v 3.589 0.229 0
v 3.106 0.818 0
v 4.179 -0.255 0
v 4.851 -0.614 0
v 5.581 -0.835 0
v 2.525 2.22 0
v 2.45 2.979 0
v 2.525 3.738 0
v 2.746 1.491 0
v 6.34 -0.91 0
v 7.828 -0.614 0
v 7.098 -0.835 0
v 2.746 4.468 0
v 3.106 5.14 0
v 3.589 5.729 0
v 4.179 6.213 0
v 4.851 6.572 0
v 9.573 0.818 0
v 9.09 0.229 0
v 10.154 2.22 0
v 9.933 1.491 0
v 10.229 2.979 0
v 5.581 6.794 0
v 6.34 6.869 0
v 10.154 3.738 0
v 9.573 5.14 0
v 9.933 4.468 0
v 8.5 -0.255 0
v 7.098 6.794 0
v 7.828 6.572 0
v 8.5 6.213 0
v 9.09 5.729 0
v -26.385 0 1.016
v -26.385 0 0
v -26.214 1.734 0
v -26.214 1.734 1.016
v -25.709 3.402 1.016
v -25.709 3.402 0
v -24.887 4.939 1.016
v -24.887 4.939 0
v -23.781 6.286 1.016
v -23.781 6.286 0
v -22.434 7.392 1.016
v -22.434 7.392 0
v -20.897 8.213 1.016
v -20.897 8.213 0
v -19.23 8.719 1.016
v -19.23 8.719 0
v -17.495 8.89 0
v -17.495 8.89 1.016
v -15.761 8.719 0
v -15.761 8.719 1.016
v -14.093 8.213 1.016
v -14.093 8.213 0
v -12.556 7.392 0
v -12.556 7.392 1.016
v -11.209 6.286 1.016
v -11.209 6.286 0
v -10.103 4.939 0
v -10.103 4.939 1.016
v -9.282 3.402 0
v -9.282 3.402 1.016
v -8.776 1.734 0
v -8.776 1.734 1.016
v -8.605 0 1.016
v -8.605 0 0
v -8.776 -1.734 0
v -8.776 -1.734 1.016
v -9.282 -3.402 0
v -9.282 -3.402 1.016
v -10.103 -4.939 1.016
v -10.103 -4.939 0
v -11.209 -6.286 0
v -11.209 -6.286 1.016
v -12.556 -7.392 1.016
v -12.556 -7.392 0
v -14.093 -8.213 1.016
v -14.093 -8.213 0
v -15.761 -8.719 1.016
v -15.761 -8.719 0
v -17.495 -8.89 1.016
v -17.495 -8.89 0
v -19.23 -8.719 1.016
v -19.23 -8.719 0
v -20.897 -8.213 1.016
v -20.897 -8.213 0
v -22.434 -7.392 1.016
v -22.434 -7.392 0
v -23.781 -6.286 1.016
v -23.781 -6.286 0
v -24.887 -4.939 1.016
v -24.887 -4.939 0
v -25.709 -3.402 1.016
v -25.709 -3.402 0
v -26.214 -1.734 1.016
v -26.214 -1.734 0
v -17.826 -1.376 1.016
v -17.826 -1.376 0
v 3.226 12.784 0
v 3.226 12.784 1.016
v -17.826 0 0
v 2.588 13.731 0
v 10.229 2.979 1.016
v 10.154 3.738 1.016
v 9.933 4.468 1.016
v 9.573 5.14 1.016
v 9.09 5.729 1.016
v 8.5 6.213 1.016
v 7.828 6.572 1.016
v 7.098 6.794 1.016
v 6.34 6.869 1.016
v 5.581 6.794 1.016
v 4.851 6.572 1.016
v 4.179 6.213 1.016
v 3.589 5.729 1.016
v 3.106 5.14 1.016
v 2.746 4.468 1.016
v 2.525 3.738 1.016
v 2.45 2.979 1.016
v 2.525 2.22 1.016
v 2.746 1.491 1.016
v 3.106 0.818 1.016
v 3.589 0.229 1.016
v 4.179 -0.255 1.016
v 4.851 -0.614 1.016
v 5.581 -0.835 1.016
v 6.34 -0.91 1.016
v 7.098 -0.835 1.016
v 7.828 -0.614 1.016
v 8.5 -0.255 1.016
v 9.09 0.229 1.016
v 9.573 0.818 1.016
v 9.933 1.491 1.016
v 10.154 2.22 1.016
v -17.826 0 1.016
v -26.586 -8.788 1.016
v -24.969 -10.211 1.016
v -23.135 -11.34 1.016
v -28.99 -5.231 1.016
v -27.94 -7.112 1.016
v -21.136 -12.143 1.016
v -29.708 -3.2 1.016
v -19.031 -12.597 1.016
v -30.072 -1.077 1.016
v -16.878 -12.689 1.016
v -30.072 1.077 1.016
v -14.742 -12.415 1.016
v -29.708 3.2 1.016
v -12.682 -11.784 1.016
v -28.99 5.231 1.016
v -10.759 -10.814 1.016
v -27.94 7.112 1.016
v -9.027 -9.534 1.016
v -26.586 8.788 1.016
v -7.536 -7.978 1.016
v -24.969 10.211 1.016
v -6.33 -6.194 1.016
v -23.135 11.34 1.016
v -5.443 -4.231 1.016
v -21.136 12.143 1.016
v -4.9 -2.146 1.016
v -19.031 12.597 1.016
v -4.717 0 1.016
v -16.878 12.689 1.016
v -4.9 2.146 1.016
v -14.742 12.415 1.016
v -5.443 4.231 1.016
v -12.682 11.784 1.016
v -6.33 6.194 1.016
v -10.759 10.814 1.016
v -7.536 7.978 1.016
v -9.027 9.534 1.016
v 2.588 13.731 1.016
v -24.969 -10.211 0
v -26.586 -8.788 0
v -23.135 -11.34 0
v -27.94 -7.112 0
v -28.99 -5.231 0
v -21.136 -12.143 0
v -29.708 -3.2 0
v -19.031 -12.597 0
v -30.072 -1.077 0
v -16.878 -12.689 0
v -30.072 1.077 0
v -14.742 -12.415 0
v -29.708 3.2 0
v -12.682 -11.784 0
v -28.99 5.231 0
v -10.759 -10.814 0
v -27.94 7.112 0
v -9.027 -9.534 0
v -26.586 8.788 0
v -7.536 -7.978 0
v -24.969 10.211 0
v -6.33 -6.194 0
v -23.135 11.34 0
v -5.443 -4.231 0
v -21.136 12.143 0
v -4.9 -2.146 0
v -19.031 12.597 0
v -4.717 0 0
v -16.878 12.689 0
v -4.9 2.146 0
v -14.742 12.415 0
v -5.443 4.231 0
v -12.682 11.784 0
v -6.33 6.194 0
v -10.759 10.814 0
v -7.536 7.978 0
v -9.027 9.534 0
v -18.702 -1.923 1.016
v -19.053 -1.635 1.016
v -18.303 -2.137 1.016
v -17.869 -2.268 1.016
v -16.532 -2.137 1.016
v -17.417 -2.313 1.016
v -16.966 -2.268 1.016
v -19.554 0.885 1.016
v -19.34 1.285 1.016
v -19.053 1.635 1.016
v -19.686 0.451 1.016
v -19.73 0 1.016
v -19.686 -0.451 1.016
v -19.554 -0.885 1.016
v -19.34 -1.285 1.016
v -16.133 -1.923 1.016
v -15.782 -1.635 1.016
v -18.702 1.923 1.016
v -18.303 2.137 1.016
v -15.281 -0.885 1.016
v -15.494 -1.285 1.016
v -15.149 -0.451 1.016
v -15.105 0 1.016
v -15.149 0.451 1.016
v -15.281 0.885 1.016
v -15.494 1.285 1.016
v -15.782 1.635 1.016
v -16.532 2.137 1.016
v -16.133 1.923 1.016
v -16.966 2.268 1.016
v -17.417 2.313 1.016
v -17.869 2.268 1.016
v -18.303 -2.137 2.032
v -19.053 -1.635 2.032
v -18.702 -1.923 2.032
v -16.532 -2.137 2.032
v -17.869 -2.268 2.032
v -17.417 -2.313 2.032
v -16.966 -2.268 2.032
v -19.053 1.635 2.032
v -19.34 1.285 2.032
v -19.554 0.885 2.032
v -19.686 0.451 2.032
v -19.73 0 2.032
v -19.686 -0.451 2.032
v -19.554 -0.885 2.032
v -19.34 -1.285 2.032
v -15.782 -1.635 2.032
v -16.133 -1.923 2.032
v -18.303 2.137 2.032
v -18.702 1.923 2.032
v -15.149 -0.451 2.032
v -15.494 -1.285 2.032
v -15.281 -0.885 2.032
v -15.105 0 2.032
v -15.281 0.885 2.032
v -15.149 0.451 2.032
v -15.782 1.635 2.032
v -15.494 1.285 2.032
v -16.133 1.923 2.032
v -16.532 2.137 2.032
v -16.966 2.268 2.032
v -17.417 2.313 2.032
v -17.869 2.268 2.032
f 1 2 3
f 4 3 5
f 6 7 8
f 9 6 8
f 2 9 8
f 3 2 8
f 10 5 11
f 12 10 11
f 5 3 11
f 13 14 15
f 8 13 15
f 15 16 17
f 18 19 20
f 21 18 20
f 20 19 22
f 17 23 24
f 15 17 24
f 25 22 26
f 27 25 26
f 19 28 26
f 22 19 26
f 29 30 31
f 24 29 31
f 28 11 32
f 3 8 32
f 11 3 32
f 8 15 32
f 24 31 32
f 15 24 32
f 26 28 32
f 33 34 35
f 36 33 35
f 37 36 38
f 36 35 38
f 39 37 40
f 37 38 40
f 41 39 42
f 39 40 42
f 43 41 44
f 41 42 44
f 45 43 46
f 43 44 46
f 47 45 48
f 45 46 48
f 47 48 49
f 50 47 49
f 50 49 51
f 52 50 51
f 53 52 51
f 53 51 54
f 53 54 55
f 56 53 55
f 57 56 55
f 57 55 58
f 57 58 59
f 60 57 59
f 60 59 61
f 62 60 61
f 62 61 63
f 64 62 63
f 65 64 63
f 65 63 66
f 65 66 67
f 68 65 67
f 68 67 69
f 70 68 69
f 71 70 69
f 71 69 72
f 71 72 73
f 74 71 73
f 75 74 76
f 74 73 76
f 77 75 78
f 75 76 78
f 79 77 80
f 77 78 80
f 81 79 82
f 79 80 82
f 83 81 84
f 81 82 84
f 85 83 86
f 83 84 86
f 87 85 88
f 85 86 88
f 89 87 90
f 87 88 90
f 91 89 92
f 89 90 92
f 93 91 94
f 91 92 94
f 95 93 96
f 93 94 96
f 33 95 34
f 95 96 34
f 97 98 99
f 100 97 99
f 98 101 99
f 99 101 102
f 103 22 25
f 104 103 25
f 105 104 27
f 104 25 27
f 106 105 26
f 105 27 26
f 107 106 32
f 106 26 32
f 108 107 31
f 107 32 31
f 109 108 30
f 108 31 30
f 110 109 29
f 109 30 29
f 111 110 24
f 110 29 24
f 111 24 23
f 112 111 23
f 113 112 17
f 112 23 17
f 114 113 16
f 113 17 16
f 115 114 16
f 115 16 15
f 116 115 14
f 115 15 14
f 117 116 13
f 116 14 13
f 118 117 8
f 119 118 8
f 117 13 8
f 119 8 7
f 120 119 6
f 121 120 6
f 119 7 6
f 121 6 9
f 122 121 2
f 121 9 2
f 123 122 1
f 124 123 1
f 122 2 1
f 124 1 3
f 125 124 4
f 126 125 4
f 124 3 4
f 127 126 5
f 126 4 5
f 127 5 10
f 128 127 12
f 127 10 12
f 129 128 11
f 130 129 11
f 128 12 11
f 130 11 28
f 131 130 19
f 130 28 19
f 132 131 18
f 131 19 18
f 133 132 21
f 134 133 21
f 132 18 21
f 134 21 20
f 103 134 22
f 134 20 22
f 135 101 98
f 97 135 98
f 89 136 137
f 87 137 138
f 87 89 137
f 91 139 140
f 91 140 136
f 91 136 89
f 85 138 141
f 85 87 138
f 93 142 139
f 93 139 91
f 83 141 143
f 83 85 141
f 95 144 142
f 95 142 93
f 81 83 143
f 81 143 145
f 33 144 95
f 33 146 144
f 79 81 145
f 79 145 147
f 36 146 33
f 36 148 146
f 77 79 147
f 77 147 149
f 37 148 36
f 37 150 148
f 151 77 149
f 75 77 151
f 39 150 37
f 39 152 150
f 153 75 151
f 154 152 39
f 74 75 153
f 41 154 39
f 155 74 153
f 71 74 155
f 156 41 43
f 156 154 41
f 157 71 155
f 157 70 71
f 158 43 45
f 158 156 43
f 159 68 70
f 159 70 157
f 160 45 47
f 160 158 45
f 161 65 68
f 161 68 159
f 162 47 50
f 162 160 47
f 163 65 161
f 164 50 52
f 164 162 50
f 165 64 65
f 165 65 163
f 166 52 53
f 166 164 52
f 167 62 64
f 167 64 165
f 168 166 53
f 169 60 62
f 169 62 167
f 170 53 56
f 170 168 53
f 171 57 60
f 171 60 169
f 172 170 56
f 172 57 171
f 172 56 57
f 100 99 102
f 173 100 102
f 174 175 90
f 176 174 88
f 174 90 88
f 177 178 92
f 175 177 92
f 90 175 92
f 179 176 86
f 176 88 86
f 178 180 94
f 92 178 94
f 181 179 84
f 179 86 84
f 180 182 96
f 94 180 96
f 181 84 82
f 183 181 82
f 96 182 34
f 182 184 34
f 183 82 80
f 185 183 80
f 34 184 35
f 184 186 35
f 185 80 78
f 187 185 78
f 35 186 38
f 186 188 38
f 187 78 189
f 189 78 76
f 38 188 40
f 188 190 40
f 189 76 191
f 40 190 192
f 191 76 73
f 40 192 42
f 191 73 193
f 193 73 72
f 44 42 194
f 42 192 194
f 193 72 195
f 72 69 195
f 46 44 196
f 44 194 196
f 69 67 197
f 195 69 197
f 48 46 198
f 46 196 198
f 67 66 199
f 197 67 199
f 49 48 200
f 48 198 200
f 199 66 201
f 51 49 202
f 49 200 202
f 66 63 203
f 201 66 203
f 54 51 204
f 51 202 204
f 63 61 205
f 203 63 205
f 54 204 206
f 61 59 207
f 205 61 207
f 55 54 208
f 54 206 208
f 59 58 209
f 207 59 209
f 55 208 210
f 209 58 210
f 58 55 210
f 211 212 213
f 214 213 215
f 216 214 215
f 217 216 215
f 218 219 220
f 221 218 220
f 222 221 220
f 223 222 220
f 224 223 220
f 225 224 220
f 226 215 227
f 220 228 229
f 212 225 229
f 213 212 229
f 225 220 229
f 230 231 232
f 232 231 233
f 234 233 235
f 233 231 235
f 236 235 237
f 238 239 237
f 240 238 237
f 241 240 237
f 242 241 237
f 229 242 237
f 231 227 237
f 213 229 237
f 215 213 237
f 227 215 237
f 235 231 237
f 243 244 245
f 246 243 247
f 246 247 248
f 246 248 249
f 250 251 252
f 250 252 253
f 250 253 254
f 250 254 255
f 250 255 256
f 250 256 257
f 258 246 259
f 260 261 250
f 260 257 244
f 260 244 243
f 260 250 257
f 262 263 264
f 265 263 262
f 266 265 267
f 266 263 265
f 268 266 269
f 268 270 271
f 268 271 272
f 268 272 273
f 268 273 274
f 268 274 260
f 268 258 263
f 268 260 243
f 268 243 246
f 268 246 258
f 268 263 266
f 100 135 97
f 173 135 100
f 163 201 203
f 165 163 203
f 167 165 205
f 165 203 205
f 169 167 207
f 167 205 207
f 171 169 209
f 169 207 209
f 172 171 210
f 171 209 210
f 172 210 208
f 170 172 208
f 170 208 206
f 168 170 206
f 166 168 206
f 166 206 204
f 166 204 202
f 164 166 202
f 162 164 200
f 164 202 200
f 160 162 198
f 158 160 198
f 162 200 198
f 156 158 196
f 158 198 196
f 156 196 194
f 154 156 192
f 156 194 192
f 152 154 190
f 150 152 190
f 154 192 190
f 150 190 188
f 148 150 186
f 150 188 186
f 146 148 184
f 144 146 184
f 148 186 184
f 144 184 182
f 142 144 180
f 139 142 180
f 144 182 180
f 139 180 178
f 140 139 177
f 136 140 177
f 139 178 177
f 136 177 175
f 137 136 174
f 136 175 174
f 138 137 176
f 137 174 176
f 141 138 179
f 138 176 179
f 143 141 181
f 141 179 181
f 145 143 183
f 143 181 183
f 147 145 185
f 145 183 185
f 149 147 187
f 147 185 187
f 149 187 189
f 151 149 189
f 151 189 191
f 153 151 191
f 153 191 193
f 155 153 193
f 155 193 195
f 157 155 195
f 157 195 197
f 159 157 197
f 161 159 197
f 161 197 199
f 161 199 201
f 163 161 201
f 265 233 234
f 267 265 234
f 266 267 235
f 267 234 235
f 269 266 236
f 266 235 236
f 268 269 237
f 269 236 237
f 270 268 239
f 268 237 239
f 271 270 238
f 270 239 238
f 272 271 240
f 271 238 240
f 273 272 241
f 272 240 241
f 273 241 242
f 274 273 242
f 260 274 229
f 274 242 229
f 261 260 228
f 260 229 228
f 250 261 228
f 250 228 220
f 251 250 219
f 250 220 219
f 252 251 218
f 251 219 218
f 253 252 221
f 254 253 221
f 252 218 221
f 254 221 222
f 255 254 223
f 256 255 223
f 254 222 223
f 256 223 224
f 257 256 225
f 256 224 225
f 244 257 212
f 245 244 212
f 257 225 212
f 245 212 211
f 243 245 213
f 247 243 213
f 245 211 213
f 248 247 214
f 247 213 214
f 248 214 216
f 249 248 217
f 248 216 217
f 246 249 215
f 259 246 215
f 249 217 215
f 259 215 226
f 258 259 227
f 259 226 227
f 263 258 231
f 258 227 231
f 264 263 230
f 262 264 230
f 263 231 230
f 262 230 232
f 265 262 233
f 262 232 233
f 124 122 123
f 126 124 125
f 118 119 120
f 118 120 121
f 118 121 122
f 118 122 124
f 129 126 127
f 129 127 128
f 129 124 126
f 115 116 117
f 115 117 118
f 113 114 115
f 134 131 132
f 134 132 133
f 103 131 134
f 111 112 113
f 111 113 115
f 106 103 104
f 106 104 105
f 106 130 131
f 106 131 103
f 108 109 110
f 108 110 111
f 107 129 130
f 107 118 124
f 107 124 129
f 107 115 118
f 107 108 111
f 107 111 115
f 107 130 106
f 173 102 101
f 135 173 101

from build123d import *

# Parameters (mm, degrees)
F0_R     = 12.7
F1_DEPTH = 1.016
F4_D     = 17.78
F2_R     = 2.31276
F5_DEPTH = 1.016
F6_R     = 3.889342
F7_DEPTH = 1.016
F9_DEPTH = 1.016


with BuildPart() as f1:
    # F0 (on Top) → F1 (new body)
    with BuildSketch(Plane.XY):
        with Locations((-17.417479, 0)):
            Circle(F0_R)
    extrude(amount=F1_DEPTH)

    # F4 (through all)
    with Locations(Plane.XY.offset(1.016)):
        with Locations((-17.495254, 0)):
            Hole(F4_D / 2)


with BuildPart() as f5:
    # F2 (on face) → F5 (new body)
    with BuildSketch(Plane.XY.offset(1.016)):
        with Locations((-17.417479, 0)):
            Circle(F2_R)
    extrude(amount=F5_DEPTH)


with BuildPart() as f7:
    # F6 (on Top) → F7 (new body)
    with BuildSketch(Plane.XY):
        with Locations((6.339503, 2.97921)):
            Circle(F6_R)
    extrude(amount=F7_DEPTH)


with BuildPart() as f9:
    # F8 (on Top) → F9 (new body)
    with BuildSketch(Plane.XY):
        Polygon((2.588258, 13.731278), (-17.825969, 0), (-17.825969, -1.376493), (3.225721, 12.783564), align=None)
    extrude(amount=F9_DEPTH)


solid = Compound([f1.part, f5.part, f7.part, f9.part])
